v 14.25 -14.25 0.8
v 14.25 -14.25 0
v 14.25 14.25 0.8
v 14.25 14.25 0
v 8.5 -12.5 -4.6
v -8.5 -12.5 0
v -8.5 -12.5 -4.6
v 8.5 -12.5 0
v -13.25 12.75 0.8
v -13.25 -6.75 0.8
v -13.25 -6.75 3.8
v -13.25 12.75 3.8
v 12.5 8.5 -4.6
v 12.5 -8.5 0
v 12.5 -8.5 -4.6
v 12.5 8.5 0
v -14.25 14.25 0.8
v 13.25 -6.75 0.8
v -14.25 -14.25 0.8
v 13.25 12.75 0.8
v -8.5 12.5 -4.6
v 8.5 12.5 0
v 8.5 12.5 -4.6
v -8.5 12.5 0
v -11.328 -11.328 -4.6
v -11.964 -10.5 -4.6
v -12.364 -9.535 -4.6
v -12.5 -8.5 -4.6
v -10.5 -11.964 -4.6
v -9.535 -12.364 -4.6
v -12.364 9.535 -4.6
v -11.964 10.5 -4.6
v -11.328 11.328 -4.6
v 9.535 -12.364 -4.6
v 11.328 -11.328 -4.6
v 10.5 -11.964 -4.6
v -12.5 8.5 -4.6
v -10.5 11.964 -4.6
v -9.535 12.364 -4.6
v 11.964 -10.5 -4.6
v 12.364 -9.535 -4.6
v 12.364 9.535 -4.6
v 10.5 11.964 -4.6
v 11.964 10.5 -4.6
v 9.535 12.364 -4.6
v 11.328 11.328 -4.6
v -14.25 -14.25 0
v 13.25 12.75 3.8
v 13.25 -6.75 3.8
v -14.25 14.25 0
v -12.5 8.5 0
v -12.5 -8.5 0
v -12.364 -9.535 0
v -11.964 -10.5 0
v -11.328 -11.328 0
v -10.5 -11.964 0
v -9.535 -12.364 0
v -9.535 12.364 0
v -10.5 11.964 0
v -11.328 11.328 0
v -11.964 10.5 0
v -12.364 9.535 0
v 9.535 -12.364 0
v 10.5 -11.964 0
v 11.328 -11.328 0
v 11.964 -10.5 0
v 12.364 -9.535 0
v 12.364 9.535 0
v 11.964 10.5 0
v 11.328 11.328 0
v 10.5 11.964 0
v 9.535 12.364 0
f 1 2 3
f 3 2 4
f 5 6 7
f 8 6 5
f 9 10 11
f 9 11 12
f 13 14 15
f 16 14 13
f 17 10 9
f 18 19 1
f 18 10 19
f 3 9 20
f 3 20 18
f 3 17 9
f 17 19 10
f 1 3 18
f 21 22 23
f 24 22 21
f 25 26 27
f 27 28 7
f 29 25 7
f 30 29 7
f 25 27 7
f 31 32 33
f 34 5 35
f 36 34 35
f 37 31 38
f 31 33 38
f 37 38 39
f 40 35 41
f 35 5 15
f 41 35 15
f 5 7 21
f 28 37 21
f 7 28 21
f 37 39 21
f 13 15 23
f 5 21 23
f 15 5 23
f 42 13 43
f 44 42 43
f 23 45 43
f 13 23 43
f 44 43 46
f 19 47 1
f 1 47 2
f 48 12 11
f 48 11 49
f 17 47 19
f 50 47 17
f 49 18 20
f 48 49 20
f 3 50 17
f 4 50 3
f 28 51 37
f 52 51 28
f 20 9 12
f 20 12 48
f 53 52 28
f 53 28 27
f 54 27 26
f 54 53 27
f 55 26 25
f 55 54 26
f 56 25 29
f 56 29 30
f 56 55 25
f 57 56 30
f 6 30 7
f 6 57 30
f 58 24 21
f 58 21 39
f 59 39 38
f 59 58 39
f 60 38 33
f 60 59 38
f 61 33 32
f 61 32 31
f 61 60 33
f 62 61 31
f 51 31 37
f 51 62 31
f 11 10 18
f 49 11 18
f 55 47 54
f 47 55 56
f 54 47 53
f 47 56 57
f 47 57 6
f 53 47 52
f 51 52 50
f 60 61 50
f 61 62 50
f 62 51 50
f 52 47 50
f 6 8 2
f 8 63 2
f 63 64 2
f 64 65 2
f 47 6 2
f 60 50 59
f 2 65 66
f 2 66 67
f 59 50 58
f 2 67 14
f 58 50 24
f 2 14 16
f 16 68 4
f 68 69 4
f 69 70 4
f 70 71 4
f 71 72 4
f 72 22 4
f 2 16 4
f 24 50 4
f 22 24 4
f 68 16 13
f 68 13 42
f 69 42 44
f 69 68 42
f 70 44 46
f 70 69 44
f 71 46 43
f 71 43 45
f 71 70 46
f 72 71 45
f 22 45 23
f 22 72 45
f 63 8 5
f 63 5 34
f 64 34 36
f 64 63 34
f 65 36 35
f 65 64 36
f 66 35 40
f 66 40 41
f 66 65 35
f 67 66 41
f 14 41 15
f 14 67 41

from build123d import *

# Parameters (mm, degrees)
SKETCH_1_W      = 28.5
SKETCH_1_H      = 28.5
EXTRUDE_1_DEPTH = 0.8
SKETCH_2_W      = 26.5
SKETCH_2_H      = 19.5
EXTRUDE_2_DEPTH = 3
EXTRUDE_START   = -3.8
EXTRUDE_3_DEPTH = 4.6


with BuildPart() as part:
    # Эскиз1 → Бобышка-Вытянуть1 (new body)
    with BuildSketch(Plane.XY):
        Rectangle(SKETCH_1_W, SKETCH_1_H)
    extrude(amount=EXTRUDE_1_DEPTH)

    # Эскиз2 → Бобышка-Вытянуть2 (add)
    with BuildSketch(Plane.XY.offset(0.8)):
        with Locations((0, 3)):
            Rectangle(SKETCH_2_W, SKETCH_2_H)
    extrude(amount=EXTRUDE_2_DEPTH)

    # Эскиз5 → Бобышка-Вытянуть3 (add)
    with BuildSketch(Plane.XY.offset(3.8).offset(EXTRUDE_START)):
        with BuildLine():
            Line((-8.5, -12.5), (8.5, -12.5))
            ThreePointArc((8.5, -12.5), (11.328427125, -11.328427125), (12.5, -8.5))
            Line((12.5, -8.5), (12.5, 8.5))
            ThreePointArc((12.5, 8.5), (11.328427125, 11.328427125), (8.5, 12.5))
            Line((8.5, 12.5), (-8.5, 12.5))
            ThreePointArc((-8.5, 12.5), (-11.328427125, 11.328427125), (-12.5, 8.5))
            Line((-12.5, 8.5), (-12.5, -8.5))
            ThreePointArc((-12.5, -8.5), (-11.328427125, -11.328427125), (-8.5, -12.5))
        make_face()
    extrude(amount=-EXTRUDE_3_DEPTH)


solid = part.part
